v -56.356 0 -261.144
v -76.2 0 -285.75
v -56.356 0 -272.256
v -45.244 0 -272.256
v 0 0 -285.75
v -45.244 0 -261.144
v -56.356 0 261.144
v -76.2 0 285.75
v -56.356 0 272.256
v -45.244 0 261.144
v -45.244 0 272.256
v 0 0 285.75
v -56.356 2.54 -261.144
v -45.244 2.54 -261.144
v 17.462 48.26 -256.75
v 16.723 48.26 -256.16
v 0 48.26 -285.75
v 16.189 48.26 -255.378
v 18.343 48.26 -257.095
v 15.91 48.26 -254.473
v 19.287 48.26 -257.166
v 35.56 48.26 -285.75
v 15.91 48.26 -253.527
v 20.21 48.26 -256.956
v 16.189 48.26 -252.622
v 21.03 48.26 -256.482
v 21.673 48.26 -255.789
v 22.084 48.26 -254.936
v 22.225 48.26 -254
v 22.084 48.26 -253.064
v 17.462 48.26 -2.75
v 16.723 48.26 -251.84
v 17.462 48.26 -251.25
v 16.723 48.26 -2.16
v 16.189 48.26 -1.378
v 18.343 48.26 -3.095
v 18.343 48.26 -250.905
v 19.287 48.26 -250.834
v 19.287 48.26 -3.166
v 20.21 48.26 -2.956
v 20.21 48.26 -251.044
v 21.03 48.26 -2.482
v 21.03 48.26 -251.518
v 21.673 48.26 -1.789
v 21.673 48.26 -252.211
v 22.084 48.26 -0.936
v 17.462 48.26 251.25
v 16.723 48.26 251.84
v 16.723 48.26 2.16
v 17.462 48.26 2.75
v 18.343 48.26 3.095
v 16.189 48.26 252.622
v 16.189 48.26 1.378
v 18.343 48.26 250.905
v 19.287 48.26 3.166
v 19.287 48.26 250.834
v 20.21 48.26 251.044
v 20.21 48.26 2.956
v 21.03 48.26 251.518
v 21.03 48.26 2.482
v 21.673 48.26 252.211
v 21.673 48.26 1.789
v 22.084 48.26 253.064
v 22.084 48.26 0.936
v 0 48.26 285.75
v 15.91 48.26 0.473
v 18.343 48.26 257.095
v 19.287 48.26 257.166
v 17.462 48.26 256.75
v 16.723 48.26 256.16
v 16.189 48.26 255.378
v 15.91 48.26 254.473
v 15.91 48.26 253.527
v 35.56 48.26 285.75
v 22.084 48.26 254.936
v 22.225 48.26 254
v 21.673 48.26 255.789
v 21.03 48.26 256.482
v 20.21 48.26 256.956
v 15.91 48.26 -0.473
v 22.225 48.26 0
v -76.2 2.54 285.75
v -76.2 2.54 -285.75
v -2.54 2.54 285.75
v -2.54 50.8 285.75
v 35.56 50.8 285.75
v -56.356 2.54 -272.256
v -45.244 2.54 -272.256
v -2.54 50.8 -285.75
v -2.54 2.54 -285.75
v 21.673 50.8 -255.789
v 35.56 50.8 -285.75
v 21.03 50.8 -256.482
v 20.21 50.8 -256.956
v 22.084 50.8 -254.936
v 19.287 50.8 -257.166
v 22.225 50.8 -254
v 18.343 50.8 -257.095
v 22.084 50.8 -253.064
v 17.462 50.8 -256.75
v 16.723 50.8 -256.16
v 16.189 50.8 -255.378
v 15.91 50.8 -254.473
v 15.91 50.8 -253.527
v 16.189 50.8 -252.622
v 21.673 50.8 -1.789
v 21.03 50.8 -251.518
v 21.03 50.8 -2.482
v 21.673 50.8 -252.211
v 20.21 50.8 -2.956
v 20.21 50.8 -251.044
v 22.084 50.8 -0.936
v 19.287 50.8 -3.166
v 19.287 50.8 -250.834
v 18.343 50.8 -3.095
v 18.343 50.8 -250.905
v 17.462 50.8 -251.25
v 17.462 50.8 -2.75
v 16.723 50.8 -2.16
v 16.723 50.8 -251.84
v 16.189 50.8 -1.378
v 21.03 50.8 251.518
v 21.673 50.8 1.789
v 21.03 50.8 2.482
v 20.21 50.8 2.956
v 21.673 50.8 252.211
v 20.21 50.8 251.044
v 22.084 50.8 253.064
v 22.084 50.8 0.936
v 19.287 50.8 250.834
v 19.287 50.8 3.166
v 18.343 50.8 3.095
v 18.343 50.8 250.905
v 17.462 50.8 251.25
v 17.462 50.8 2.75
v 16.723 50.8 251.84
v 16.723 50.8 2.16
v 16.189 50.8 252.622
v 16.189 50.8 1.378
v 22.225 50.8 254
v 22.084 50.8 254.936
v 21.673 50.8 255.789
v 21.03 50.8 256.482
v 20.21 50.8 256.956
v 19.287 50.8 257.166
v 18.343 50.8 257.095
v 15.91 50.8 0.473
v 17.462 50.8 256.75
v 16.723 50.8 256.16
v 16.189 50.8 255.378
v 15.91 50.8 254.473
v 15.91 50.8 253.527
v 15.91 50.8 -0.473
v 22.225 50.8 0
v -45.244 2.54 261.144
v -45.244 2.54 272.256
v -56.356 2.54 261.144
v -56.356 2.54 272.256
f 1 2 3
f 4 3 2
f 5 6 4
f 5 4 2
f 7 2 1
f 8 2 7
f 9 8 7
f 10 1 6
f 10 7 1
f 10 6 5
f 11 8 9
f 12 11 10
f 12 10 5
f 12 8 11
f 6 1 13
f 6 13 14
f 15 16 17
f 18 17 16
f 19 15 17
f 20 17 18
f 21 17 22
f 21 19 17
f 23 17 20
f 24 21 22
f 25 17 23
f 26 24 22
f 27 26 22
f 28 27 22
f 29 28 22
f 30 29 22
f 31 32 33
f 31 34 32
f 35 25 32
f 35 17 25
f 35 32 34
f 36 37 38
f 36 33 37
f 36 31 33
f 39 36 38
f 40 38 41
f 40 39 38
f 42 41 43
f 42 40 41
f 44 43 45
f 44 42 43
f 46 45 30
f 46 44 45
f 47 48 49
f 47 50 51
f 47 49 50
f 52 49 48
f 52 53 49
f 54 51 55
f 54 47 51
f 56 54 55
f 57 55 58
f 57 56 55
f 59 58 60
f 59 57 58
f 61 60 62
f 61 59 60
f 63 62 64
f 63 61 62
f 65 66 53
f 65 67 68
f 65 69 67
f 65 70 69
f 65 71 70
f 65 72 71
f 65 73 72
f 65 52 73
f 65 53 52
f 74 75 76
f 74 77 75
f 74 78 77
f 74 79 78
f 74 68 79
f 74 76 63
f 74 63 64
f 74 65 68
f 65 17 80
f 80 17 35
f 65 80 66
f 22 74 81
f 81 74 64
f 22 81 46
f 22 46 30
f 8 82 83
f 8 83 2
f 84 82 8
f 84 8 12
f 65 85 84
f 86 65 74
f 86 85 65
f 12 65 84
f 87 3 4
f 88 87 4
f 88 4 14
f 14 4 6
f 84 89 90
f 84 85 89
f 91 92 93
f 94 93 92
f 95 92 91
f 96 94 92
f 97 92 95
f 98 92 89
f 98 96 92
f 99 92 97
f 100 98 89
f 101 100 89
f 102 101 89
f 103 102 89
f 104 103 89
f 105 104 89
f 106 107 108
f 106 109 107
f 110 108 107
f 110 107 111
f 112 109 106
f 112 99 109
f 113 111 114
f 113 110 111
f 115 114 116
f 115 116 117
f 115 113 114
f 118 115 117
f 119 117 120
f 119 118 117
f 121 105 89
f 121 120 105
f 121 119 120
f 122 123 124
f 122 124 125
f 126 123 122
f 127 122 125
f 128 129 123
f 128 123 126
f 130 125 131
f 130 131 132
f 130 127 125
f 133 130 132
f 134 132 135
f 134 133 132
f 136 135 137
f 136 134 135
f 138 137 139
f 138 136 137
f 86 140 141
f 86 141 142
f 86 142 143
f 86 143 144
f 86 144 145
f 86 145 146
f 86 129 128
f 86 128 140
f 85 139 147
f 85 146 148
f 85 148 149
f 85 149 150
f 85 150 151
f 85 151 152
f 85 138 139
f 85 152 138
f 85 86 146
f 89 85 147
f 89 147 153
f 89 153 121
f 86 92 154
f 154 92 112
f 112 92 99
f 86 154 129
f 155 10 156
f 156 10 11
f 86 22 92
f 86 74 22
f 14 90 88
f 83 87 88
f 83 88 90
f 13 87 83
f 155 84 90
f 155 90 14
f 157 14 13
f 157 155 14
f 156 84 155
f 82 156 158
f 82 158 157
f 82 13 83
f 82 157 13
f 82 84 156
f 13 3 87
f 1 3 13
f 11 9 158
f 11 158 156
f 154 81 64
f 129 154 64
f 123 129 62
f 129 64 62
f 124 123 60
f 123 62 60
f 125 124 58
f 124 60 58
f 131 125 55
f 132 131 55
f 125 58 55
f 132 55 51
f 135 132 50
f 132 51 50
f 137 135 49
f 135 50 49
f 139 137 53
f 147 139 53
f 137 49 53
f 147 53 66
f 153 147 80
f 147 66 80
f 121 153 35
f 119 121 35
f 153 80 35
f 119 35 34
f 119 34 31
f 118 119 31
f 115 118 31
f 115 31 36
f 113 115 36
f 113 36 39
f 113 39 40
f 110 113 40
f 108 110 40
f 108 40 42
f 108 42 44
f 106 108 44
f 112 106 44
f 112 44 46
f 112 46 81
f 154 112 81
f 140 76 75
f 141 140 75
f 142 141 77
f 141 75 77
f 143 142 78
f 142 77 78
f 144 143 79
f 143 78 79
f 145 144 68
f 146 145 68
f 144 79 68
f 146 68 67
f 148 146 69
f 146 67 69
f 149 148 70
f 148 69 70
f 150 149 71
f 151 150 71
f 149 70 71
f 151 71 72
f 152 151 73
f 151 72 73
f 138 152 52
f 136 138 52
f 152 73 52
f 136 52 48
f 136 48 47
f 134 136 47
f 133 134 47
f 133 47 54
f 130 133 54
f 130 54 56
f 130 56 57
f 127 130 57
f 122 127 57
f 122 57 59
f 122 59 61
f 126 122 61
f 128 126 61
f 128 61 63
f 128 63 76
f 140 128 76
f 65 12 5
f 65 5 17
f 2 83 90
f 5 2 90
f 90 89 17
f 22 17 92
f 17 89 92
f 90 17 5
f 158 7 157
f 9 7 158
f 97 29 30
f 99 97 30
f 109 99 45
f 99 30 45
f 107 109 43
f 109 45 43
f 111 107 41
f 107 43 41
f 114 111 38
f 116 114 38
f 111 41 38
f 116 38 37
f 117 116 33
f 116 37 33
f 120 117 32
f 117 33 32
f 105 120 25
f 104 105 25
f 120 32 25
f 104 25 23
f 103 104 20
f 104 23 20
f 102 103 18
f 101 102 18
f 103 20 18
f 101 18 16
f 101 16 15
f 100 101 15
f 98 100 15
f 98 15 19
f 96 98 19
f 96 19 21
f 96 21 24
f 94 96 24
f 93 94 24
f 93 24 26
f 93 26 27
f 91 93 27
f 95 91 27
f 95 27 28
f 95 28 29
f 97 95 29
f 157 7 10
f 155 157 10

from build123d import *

# Parameters (mm, degrees)
F1_DEPTH = 285.75
F2_W     = 11.1125
F2_H     = 11.1125
F2_R     = 3.175
F3_DEPTH = 50.801


with BuildPart() as f1:
    # F0 (on Top) → F1 (new body, symmetric)
    with BuildSketch(Plane.XY):
        Polygon((-2.54, 50.8), (-2.54, 2.54), (-76.2, 2.54), (-76.2, 0), (0, 0), (0, 48.26), (35.56, 48.26), (35.56, 50.8), align=None)
    extrude(amount=F1_DEPTH, both=True)

    # F2 (on face) → F3 (cut, through all)
    with BuildSketch(Plane.XZ):
        with Locations((-50.8, 266.7)):
            Rectangle(F2_W, F2_H)
        with Locations((-50.8, -266.7)):
            Rectangle(F2_W, F2_H)
        with Locations((19.05, 254)):
            Circle(F2_R)
        with Locations((19.05, 0)):
            Circle(F2_R)
        with Locations((19.05, -254)):
            Circle(F2_R)
    extrude(amount=-F3_DEPTH, mode=Mode.SUBTRACT)


solid = f1.part
